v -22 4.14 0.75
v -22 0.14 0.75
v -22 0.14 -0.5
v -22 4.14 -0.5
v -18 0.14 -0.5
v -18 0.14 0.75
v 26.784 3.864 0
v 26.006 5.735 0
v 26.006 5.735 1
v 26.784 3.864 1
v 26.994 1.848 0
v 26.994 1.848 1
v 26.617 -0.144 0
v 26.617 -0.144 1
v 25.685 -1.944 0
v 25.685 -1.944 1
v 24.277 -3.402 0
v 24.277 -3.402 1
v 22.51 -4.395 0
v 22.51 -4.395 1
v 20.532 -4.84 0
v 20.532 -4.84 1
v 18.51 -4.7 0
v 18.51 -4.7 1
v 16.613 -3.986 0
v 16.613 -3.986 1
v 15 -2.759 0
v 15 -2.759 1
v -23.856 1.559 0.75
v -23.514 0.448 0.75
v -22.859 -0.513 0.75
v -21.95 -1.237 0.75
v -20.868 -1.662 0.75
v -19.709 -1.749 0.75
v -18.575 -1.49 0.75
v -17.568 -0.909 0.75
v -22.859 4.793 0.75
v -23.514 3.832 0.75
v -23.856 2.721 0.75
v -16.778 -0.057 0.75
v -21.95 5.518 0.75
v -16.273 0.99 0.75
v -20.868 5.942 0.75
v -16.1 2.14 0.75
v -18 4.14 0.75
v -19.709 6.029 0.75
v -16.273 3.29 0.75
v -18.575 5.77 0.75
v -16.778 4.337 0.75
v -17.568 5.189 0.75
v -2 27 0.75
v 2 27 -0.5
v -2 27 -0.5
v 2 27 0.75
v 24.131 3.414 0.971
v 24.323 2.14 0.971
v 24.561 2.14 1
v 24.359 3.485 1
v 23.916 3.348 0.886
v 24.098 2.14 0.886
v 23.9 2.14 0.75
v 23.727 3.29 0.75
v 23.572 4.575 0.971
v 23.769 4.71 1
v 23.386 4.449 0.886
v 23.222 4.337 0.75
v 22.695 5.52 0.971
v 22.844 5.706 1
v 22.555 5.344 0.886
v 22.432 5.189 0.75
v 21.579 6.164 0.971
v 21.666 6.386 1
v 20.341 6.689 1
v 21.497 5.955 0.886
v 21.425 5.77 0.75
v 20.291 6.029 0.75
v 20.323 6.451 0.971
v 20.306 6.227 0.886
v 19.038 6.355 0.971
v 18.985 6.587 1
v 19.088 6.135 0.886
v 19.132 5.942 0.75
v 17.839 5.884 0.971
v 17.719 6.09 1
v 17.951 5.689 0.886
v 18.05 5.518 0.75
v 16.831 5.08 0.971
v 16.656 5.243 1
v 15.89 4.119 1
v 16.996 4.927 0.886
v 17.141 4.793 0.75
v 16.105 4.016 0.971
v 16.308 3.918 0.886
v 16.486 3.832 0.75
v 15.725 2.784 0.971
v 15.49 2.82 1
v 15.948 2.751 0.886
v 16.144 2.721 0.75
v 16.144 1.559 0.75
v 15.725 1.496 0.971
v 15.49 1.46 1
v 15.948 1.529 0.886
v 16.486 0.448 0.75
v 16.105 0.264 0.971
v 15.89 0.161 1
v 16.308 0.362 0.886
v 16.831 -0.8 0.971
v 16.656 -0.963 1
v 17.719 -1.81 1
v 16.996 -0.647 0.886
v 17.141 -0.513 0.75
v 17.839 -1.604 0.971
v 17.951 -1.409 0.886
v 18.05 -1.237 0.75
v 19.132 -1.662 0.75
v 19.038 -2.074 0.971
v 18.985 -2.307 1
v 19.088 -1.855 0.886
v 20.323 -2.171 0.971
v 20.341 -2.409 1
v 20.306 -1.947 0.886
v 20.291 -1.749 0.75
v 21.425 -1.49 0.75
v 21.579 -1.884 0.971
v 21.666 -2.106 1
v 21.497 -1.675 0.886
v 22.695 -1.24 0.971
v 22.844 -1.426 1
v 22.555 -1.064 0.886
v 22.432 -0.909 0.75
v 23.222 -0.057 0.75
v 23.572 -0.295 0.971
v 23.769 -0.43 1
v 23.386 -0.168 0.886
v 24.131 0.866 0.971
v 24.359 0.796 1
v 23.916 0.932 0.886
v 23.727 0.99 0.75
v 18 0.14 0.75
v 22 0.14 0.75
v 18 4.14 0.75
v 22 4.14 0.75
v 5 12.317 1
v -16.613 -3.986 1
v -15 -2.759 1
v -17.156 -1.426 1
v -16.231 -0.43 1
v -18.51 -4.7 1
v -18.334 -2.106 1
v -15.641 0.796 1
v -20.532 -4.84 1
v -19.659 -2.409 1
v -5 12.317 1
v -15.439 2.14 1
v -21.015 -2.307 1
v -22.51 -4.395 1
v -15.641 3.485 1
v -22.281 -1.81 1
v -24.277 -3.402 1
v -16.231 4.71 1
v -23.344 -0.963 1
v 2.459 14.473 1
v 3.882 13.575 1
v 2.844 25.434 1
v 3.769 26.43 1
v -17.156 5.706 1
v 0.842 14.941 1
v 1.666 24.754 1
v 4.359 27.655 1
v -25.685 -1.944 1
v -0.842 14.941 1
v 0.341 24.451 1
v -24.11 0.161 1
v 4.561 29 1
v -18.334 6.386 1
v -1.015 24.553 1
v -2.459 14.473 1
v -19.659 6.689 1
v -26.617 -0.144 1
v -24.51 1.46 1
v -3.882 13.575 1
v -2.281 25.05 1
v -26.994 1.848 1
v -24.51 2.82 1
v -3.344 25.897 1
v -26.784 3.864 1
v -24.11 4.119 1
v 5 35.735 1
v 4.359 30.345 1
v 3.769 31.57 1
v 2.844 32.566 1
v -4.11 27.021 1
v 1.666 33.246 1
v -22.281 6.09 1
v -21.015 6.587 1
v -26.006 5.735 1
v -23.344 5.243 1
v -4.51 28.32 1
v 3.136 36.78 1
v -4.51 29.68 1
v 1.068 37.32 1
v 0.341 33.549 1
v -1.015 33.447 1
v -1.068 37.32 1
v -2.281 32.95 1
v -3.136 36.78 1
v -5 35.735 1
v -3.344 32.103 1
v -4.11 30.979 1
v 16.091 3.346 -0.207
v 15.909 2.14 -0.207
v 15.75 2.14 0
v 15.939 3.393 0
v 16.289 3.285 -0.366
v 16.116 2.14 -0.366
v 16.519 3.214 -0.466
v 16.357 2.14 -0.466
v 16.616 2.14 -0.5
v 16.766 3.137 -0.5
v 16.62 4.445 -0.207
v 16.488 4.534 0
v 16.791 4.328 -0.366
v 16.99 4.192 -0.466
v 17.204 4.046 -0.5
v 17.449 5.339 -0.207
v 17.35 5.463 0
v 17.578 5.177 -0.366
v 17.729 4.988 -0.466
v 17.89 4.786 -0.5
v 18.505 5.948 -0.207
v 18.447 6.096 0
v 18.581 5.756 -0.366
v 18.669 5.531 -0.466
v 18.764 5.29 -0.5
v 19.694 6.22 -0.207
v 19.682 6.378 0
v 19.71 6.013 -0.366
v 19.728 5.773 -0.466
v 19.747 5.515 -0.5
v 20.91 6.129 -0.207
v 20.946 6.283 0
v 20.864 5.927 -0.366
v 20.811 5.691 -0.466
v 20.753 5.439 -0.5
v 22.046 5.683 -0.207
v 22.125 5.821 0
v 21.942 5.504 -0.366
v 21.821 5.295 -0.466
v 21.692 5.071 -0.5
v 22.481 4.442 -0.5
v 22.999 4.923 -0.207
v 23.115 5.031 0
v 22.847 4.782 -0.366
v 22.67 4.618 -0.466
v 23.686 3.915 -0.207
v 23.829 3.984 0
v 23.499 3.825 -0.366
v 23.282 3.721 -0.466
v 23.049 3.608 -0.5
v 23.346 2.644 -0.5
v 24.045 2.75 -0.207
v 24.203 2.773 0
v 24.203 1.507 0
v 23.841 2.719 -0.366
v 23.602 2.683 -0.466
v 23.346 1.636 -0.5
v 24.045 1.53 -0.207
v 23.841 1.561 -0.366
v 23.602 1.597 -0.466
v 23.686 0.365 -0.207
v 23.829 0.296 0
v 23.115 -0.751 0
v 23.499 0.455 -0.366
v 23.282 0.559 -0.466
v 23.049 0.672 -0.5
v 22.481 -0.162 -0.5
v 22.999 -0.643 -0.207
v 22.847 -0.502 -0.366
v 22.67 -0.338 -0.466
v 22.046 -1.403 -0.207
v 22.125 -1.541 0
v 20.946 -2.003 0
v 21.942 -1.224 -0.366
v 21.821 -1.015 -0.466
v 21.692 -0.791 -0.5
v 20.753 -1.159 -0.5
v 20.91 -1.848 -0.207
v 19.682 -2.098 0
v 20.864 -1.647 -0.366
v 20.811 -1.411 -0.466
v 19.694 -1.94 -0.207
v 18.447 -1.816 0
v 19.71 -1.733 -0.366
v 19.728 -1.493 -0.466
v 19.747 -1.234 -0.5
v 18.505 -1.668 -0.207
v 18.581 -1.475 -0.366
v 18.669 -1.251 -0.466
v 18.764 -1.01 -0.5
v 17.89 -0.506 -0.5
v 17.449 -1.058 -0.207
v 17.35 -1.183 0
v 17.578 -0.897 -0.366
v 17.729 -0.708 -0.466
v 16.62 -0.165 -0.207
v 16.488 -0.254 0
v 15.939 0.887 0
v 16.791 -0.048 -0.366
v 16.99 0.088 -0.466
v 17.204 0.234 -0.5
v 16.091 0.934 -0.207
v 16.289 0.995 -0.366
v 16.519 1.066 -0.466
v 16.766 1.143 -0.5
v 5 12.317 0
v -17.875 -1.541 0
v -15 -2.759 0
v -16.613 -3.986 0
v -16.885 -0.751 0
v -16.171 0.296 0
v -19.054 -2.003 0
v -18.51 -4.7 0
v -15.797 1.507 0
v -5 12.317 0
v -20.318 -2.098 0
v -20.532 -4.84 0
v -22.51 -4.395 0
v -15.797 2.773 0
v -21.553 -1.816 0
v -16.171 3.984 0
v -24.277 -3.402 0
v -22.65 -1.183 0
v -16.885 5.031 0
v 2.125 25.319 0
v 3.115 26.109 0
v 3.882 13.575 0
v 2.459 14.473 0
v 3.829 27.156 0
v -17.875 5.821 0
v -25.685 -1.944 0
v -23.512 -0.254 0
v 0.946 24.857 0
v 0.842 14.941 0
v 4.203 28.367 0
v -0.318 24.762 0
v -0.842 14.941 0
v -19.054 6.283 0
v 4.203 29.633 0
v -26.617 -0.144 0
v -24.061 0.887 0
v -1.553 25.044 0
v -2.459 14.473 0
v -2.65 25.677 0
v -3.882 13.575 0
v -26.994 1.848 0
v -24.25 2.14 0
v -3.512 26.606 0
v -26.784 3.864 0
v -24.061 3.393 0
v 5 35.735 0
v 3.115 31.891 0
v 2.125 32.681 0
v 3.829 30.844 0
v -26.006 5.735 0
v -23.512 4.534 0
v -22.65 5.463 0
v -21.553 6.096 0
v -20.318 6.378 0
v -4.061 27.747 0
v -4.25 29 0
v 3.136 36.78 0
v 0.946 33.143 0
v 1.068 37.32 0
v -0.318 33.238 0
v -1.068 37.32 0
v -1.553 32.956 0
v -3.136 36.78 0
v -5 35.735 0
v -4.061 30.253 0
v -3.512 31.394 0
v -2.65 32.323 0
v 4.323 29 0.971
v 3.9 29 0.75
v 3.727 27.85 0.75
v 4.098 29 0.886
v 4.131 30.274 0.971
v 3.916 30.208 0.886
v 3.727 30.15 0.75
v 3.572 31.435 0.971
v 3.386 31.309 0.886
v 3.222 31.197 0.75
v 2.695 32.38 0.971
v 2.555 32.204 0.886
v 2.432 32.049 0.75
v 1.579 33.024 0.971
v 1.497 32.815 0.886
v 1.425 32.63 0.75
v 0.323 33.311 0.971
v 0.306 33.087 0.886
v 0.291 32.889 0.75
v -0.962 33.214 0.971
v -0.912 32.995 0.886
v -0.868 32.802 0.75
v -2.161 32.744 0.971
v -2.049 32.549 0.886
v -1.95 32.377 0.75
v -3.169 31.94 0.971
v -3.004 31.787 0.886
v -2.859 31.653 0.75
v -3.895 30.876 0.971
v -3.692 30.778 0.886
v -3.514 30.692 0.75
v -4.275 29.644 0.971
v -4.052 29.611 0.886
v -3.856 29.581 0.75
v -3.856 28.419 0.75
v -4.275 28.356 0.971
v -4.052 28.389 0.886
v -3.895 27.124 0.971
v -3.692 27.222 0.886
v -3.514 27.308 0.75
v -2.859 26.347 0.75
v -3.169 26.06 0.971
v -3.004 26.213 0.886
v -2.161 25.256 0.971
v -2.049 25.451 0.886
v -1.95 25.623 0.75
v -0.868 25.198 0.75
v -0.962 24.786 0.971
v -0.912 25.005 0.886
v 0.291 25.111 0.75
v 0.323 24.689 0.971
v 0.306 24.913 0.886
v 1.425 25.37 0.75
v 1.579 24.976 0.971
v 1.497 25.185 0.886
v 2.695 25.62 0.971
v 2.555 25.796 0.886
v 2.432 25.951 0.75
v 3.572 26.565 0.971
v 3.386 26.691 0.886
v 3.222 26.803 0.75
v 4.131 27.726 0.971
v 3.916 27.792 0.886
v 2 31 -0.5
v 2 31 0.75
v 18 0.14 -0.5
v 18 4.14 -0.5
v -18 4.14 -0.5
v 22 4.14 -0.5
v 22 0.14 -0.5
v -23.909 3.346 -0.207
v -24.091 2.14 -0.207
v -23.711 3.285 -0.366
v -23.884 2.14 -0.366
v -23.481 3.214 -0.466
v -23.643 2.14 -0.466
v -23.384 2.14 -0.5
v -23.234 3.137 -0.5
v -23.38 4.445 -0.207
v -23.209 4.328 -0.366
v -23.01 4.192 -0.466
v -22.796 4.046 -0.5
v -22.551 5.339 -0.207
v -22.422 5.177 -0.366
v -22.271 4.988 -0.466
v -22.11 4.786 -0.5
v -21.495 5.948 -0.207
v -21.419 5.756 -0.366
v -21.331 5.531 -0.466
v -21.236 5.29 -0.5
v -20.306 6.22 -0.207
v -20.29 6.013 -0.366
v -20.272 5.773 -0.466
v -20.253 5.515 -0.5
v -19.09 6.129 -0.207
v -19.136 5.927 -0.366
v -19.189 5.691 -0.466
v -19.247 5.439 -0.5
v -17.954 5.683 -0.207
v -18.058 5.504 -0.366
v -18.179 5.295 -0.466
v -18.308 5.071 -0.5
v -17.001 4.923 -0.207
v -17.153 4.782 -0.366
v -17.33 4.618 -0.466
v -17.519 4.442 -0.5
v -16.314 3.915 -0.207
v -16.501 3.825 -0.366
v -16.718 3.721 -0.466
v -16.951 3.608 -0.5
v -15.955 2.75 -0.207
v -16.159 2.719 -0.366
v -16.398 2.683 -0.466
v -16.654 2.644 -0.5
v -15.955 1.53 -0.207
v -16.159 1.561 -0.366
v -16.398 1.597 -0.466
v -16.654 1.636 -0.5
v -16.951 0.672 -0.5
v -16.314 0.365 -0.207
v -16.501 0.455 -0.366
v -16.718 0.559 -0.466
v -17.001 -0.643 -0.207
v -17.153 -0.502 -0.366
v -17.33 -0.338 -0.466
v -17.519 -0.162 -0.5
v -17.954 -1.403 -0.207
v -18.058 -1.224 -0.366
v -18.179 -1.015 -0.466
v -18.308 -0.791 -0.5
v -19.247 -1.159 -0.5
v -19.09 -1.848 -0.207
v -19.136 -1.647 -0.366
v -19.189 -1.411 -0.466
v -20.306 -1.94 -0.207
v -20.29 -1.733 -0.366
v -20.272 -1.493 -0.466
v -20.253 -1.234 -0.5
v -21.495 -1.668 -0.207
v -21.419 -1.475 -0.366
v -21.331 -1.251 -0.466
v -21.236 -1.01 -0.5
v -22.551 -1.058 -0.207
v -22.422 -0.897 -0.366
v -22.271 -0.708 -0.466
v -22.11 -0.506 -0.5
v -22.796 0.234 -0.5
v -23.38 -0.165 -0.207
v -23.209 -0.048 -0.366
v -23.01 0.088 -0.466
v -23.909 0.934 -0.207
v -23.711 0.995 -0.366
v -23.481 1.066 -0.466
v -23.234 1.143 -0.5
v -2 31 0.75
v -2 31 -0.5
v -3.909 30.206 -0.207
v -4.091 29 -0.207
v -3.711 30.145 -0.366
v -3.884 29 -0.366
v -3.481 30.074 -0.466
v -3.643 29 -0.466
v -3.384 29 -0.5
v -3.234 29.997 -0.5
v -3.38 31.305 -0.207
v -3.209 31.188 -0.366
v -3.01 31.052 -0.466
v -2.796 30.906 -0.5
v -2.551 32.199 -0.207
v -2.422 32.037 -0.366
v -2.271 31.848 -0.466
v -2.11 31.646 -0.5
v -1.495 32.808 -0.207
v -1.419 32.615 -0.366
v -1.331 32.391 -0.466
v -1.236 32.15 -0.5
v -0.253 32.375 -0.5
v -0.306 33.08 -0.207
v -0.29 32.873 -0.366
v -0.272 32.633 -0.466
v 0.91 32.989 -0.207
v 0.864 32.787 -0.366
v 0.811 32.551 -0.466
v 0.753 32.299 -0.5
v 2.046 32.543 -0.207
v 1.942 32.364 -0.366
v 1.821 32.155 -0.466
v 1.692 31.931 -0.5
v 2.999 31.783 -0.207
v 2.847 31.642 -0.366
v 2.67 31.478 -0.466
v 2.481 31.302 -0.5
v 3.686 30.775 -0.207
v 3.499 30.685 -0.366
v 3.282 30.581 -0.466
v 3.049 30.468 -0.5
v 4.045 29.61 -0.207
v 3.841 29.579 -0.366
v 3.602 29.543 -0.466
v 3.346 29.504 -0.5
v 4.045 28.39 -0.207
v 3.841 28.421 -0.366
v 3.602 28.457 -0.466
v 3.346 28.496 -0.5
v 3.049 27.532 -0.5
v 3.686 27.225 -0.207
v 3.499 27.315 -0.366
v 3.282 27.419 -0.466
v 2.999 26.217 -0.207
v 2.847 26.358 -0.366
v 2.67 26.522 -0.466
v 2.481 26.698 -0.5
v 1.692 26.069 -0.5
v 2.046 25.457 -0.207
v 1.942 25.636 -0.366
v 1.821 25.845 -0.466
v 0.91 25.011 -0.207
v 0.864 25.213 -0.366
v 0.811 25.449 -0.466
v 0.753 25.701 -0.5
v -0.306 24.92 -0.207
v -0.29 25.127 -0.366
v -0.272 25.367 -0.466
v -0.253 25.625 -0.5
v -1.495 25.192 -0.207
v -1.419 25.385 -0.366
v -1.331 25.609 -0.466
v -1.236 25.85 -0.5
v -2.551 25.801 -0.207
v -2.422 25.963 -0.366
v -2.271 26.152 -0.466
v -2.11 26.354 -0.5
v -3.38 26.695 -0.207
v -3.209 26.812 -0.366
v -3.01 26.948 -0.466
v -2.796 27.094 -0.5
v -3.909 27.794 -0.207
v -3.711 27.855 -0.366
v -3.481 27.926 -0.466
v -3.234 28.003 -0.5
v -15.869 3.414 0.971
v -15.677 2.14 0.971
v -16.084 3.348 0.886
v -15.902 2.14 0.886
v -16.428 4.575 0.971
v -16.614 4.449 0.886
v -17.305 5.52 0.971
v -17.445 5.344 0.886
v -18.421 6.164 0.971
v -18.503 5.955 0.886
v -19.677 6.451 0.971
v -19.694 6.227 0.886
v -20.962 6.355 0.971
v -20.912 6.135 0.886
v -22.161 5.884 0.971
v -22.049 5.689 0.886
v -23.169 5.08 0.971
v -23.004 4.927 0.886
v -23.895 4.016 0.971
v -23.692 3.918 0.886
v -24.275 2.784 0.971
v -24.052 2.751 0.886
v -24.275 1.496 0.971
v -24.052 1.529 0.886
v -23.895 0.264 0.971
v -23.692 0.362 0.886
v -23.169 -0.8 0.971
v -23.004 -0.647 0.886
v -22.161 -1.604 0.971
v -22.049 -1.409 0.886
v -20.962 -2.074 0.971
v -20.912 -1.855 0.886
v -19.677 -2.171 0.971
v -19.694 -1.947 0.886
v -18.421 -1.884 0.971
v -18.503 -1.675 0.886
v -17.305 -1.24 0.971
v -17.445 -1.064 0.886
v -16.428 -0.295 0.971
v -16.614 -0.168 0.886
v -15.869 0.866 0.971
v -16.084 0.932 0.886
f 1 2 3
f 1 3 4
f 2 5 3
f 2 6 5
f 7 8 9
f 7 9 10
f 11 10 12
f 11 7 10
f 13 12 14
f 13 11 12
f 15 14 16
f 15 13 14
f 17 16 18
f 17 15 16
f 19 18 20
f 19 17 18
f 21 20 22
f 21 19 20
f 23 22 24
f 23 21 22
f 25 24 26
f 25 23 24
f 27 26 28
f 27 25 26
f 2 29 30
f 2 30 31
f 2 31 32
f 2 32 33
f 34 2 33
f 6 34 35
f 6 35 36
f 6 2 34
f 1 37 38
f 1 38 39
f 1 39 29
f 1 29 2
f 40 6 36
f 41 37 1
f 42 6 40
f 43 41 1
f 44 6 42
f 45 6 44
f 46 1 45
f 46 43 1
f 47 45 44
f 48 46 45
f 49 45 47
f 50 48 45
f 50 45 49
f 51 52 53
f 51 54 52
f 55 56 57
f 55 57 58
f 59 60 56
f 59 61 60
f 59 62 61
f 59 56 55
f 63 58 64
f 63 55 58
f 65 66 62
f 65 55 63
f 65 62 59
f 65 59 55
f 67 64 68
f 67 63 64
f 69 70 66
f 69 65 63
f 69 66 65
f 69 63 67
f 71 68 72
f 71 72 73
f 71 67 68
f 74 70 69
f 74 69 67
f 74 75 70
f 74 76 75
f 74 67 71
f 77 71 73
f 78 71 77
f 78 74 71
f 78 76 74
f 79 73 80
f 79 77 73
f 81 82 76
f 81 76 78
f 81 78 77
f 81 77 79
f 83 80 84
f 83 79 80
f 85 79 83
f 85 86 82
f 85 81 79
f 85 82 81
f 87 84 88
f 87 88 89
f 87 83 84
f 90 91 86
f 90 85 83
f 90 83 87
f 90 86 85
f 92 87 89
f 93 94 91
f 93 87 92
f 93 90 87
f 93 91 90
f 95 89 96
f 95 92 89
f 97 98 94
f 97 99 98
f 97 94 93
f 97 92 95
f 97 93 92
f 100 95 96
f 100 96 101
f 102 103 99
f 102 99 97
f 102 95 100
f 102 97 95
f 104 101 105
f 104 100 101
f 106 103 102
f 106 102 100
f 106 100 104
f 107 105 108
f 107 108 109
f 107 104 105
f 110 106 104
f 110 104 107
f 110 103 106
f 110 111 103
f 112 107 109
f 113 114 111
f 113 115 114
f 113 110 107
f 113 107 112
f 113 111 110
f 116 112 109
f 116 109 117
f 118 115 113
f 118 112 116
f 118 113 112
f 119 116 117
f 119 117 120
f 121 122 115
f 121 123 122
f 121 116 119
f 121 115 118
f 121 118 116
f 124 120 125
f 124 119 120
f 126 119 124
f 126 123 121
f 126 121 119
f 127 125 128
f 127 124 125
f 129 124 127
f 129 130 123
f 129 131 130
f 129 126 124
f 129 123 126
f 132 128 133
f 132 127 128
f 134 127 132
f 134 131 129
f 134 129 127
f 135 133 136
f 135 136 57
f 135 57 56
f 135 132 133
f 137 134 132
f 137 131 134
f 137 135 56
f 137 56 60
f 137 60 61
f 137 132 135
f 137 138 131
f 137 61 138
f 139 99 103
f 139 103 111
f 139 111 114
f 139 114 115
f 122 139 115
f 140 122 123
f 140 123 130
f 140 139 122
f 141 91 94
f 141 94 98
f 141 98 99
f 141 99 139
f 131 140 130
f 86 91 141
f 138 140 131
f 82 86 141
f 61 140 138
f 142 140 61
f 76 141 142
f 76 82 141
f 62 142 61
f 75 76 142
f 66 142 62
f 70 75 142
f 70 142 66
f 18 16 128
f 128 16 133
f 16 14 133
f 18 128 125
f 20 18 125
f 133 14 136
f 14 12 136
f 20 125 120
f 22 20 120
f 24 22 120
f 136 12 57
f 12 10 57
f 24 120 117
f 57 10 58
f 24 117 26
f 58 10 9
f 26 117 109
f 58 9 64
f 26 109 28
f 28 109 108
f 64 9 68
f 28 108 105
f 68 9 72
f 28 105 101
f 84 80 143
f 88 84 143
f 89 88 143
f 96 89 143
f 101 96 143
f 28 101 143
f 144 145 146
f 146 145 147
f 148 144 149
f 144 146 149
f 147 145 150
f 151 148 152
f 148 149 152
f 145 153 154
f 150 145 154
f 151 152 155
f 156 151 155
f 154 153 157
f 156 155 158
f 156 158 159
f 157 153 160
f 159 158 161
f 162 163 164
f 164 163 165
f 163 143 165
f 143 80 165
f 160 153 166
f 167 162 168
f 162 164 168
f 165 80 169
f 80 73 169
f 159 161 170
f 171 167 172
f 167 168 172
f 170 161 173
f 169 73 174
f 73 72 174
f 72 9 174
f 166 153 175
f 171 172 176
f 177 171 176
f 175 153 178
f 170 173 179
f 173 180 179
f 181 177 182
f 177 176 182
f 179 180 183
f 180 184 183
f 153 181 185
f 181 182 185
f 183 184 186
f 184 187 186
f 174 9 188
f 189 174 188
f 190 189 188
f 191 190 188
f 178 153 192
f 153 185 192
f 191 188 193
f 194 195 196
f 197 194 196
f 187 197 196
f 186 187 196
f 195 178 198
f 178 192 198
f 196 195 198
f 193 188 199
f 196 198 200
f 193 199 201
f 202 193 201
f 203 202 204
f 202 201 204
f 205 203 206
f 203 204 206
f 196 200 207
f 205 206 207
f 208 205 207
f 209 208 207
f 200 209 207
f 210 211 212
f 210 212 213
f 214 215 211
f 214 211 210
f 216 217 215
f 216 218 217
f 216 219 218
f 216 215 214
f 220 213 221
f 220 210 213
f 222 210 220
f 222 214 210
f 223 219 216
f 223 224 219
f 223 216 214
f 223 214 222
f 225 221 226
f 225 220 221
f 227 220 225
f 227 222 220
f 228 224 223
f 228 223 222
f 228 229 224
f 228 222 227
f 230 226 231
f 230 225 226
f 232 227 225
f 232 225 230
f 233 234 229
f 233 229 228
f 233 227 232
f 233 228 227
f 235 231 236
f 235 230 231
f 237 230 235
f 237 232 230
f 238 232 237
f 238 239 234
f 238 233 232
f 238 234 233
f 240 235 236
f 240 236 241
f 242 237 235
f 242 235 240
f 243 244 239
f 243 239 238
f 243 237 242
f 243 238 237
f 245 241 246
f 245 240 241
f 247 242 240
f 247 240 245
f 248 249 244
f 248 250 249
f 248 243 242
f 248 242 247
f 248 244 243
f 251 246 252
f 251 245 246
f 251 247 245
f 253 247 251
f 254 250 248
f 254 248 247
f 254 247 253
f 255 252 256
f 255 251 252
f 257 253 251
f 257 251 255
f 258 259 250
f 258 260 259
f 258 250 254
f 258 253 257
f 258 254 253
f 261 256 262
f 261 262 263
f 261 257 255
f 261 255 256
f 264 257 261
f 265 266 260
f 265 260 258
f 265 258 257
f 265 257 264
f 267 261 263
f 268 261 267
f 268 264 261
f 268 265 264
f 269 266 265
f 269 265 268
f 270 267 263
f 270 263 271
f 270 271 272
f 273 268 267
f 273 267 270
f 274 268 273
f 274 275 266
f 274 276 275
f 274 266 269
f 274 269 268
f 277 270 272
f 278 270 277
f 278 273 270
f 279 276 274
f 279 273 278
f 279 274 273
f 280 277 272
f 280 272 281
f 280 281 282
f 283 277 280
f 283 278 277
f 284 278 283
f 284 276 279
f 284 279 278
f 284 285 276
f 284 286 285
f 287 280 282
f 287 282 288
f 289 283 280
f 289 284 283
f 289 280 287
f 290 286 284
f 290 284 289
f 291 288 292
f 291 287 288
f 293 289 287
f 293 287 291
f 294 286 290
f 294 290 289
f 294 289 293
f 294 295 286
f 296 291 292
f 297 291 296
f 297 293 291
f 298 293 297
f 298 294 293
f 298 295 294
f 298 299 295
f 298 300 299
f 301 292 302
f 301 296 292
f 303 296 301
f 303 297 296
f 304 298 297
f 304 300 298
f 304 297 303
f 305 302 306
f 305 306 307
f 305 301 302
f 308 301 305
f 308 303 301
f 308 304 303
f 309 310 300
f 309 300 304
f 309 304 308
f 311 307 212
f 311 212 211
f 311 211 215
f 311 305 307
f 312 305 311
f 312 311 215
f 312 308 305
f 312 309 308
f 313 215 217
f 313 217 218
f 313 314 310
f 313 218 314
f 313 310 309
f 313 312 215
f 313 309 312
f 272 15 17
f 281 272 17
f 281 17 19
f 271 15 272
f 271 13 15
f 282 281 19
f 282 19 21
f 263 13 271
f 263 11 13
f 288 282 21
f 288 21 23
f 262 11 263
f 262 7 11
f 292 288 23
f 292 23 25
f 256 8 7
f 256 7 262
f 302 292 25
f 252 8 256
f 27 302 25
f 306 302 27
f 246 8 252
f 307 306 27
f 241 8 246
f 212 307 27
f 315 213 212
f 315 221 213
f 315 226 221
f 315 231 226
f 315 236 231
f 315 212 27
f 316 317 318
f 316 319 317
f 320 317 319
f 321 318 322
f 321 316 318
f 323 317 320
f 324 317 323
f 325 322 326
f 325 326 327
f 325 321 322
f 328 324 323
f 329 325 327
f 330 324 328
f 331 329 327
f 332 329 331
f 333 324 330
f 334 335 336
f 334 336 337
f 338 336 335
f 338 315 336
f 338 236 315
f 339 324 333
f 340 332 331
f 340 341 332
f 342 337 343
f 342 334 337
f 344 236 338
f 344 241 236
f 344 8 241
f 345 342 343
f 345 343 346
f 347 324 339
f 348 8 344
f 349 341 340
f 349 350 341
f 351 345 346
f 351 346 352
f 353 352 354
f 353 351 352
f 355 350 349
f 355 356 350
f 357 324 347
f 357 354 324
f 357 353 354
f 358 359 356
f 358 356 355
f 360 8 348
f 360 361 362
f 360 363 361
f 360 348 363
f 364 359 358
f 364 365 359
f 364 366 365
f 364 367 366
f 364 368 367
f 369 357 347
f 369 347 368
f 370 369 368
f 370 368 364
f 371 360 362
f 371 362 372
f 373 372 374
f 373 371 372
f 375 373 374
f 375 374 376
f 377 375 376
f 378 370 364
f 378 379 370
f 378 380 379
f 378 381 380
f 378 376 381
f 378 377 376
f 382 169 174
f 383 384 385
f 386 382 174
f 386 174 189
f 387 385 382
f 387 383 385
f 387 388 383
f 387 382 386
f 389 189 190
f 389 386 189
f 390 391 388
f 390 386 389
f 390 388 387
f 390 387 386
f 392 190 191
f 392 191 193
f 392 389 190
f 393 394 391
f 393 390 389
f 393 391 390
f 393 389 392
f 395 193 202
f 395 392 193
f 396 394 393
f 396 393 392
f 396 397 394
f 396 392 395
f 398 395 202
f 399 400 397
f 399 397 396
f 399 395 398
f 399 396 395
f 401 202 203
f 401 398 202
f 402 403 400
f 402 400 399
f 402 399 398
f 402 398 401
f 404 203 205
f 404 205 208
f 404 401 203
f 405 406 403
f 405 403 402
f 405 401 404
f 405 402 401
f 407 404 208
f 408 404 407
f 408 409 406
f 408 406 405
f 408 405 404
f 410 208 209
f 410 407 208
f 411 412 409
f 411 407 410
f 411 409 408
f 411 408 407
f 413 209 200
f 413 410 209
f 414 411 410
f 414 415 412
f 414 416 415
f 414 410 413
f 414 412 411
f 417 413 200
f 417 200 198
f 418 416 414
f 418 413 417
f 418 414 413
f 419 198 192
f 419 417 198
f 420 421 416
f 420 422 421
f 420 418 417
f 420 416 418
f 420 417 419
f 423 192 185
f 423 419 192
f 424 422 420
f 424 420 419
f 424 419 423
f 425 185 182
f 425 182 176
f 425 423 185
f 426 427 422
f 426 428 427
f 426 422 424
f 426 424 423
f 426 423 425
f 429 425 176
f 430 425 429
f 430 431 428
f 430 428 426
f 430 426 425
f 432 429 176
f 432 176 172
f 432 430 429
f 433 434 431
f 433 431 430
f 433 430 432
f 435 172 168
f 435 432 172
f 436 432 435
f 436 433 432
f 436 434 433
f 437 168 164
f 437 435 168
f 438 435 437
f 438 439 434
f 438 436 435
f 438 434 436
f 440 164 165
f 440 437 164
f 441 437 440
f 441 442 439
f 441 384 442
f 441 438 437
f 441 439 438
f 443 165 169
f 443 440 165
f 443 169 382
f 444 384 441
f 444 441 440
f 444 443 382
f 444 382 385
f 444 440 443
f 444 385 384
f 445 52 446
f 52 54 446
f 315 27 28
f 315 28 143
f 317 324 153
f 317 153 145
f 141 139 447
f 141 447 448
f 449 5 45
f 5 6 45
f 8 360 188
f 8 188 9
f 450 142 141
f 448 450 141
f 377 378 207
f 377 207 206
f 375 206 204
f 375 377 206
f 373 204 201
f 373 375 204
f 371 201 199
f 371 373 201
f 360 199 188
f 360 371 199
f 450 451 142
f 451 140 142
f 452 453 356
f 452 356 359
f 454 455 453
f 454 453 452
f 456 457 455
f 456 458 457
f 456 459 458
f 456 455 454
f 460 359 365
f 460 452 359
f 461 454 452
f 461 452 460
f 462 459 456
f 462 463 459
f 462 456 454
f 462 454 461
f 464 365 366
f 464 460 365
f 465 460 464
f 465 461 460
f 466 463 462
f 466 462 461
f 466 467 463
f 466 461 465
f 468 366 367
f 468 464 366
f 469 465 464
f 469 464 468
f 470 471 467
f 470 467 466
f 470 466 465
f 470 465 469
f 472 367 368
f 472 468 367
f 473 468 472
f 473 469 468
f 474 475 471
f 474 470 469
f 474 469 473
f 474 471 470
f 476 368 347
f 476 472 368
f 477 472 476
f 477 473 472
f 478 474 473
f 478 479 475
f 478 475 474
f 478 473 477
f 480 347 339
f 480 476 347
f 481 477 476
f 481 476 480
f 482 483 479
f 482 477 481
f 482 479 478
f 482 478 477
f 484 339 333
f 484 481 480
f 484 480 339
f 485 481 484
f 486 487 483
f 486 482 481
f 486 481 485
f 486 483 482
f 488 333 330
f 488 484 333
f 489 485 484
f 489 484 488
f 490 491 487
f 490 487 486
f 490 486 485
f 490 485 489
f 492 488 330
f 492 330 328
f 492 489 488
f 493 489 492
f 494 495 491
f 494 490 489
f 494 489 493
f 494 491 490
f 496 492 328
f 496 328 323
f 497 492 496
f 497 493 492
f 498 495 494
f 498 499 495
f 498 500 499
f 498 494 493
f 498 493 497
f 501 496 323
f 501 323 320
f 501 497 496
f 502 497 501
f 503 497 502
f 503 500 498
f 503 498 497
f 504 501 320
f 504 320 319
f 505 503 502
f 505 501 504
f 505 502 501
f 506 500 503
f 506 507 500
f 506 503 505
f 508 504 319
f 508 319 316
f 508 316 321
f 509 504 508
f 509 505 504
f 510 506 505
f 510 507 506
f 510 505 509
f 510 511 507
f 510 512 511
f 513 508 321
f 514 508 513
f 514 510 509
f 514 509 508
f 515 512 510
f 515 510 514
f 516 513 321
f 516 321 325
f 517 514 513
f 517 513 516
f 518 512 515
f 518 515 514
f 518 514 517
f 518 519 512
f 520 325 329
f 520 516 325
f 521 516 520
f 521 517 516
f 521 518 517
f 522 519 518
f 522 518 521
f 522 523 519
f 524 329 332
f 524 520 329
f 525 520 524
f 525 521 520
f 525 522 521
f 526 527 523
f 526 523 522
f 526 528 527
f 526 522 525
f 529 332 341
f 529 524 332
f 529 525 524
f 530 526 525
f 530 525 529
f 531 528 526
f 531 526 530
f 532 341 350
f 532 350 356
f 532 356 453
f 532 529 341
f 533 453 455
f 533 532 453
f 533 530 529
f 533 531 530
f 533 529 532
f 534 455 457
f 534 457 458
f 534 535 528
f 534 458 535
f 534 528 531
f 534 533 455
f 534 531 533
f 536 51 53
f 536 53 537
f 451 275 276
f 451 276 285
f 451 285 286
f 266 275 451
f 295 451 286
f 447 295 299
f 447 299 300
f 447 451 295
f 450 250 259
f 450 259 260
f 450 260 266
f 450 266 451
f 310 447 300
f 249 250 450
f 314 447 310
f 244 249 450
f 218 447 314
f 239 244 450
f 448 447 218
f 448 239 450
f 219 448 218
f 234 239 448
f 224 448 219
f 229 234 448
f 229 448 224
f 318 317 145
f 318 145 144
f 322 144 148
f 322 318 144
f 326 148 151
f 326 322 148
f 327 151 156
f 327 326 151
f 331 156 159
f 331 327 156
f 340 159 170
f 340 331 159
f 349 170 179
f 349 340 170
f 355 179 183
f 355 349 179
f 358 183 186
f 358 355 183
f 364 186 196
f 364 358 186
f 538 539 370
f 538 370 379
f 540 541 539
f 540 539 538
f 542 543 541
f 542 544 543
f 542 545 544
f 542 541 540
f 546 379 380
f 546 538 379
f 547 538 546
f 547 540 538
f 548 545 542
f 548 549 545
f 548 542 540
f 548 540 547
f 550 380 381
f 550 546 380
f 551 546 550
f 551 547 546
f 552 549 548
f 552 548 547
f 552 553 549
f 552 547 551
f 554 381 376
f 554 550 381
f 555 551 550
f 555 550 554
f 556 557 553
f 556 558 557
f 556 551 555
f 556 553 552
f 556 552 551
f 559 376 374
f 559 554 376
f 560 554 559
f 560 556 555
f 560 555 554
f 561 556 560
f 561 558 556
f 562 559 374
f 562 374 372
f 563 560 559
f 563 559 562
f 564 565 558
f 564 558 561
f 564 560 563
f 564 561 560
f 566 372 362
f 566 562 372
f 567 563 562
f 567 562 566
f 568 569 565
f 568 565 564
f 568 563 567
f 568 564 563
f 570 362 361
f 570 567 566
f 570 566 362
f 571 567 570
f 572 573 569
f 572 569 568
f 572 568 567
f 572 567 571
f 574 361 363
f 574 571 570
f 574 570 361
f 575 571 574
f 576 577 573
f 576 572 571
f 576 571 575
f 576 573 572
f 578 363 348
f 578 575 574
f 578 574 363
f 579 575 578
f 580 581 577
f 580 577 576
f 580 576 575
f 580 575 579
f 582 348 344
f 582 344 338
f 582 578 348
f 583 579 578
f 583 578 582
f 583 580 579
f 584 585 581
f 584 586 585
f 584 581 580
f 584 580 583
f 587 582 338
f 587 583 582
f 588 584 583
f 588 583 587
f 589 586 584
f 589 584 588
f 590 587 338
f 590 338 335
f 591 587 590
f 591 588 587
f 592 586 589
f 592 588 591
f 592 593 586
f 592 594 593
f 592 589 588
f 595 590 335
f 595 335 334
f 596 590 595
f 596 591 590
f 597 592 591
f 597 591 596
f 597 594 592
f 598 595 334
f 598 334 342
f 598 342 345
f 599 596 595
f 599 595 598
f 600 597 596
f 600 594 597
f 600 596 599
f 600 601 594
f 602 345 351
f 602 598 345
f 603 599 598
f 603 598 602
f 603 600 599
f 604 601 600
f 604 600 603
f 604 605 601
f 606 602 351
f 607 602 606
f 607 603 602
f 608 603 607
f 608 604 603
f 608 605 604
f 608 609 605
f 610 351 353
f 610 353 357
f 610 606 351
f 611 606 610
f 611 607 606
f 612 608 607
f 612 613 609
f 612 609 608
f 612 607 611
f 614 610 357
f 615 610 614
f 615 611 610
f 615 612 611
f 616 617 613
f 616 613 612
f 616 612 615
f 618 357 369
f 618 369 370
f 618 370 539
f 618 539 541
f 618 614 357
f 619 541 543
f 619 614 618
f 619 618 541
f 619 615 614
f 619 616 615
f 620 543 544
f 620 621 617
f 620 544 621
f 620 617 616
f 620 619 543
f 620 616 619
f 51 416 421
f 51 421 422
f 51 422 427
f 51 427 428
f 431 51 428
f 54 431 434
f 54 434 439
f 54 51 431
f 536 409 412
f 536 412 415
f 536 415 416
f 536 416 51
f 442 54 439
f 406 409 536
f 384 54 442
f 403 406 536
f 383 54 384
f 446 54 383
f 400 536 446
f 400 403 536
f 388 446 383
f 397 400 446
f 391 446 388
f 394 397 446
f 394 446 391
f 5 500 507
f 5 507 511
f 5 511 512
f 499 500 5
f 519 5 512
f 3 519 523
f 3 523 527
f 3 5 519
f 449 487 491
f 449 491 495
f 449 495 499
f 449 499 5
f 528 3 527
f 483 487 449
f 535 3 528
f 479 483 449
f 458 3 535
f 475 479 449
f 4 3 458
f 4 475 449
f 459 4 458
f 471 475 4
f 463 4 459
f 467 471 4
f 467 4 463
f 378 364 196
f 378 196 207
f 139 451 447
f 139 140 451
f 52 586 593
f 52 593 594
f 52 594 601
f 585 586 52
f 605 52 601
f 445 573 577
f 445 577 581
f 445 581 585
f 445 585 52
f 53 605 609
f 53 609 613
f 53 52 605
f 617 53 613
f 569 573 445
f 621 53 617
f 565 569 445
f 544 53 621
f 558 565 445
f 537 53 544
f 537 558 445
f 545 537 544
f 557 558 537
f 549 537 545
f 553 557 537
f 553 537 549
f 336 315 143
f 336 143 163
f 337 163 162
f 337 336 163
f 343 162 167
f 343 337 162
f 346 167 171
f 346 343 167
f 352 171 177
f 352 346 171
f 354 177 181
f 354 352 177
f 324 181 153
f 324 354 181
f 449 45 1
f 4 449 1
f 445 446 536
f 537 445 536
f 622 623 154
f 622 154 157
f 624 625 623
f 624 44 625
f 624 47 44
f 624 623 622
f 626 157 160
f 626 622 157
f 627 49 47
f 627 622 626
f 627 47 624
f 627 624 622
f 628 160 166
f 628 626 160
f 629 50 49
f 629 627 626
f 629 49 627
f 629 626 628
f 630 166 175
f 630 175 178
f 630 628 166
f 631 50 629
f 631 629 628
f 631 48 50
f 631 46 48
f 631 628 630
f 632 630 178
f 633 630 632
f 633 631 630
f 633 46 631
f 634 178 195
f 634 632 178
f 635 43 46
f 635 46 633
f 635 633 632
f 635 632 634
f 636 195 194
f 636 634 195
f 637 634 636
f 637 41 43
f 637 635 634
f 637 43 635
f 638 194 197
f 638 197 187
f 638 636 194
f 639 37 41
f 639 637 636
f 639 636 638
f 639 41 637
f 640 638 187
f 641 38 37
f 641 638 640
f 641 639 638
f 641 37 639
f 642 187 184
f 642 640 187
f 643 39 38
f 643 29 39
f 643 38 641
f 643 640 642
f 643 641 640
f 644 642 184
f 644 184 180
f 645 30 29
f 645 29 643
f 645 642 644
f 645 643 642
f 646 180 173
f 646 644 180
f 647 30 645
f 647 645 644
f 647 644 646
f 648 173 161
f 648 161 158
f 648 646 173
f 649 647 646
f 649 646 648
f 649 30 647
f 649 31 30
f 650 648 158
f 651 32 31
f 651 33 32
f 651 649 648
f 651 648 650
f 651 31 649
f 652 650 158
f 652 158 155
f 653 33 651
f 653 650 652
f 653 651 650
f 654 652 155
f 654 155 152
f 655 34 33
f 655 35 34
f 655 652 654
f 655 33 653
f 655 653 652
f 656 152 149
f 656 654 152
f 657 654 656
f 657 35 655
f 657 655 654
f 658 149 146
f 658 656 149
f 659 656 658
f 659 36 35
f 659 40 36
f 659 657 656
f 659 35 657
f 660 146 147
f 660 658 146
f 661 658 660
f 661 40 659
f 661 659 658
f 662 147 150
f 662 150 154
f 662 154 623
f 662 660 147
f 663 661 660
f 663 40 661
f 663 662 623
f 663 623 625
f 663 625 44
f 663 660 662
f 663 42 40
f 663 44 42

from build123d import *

# Parameters (mm, degrees)
BOSS_EXTRUDE2_DEPTH = 1
SKETCH2_R           = 3.9
CUT_EXTRUDE1_DEPTH  = 0.25
FILLET1_R           = 1
SKETCH5_W           = 4
SKETCH5_H           = 4
CUT_EXTRUDE6_DEPTH  = 2
SKETCH6_R           = 4.25
SKETCH6_W           = 4
SKETCH6_H           = 4
BOSS_EXTRUDE3_DEPTH = 0.5
FILLET2_R           = 1


with BuildPart() as part:
    # Sketch1 → Boss-Extrude2 (new body)
    with BuildSketch(Plane.XY):
        with BuildLine():
            Line((-5, 12.31662479), (-15, -2.758942439))
            ThreePointArc((-15, -2.758942439), (-24.276770595, -3.401554175), (-26.006226146, 5.735207068))
            Line((-26.006226146, 5.735207068), (-5, 35.735207068))
            ThreePointArc((-5, 35.735207068), (0, 37.388266463), (5, 35.735207068))
            Line((5, 35.735207068), (26.006226146, 5.735207068))
            ThreePointArc((26.006226146, 5.735207068), (24.276770595, -3.401554175), (15, -2.758942439))
            Line((15, -2.758942439), (5, 12.31662479))
            ThreePointArc((5, 12.31662479), (0, 15), (-5, 12.31662479))
        make_face()
    extrude(amount=BOSS_EXTRUDE2_DEPTH)

    # Sketch2 → Cut-Extrude1 (cut)
    with BuildSketch(Plane.XY.offset(1)):
        with Locations((-20, 2.140037047)):
            Circle(SKETCH2_R)
        with Locations((20, 2.140037047)):
            Circle(SKETCH2_R)
        with Locations((0, 29)):
            Circle(SKETCH2_R)
    extrude(amount=-CUT_EXTRUDE1_DEPTH, mode=Mode.SUBTRACT)

    # Fillet1
    # the kernel refuses this fillet: 1 mm, written as the material it takes off along each edge
    with BuildSketch(Plane(origin=(-20, 2.140037047, 1), x_dir=(1, 0, 0), z_dir=(0, -1, 0))) as fillet1_piece_1:
        with BuildLine():
            CenterArc((4.561437828, -1), FILLET1_R, 90, 41.409622109)
            Line((3.9, -0.25), (3.886771243, -0.235))
            ThreePointArc((3.886771243, -0.235), (3.88, -0.125), (3.88, 0))
            Line((3.88, 0), (3.9, 0.02))
            Line((3.9, 0.02), (4.561437828, 0.02))
            Line((4.561437828, 0.02), (4.561437828, 0))
        make_face()
    revolve(axis=Axis((-20, 2.140037047, 1), (0, 0, 1)), mode=Mode.SUBTRACT)
    with BuildSketch(Plane(origin=(20, 2.140037047, 1), x_dir=(1, 0, 0), z_dir=(0, -1, 0))) as fillet1_piece_2:
        with BuildLine():
            CenterArc((4.561437828, -1), FILLET1_R, 90, 41.409622109)
            Line((3.9, -0.25), (3.886771243, -0.235))
            ThreePointArc((3.886771243, -0.235), (3.88, -0.125), (3.88, 0))
            Line((3.88, 0), (3.9, 0.02))
            Line((3.9, 0.02), (4.561437828, 0.02))
            Line((4.561437828, 0.02), (4.561437828, 0))
        make_face()
    revolve(axis=Axis((20, 2.140037047, 1), (0, 0, 1)), mode=Mode.SUBTRACT)
    with BuildSketch(Plane(origin=(0, 29, 1), x_dir=(1, 0, 0), z_dir=(0, -1, 0))) as fillet1_piece_3:
        with BuildLine():
            CenterArc((4.561437828, -1), FILLET1_R, 90, 41.409622109)
            Line((3.9, -0.25), (3.886771243, -0.235))
            ThreePointArc((3.886771243, -0.235), (3.88, -0.125), (3.88, 0))
            Line((3.88, 0), (3.9, 0.02))
            Line((3.9, 0.02), (4.561437828, 0.02))
            Line((4.561437828, 0.02), (4.561437828, 0))
        make_face()
    revolve(axis=Axis((0, 29, 1), (0, 0, 1)), mode=Mode.SUBTRACT)

    # Sketch5 → Cut-Extrude6 (cut)
    with BuildSketch(Plane.XY.offset(1)):
        with Locations((0, 29)):
            Rectangle(SKETCH5_W, SKETCH5_H)
        with Locations((20, 2.140037047)):
            Rectangle(SKETCH5_W, SKETCH5_H)
        with Locations((-20, 2.140037047)):
            Rectangle(SKETCH5_W, SKETCH5_H)
    extrude(amount=-CUT_EXTRUDE6_DEPTH, mode=Mode.SUBTRACT)

    # Sketch6 → Boss-Extrude3 (add)
    # profile 1 of 3: a face of its own
    with BuildSketch(Plane(origin=(0, 0, 0), x_dir=(-1, 0, 0), z_dir=(0, 0, -1))):
        with Locations((0, 29)):
            Circle(SKETCH6_R)
        with Locations((0, 29)):
            Rectangle(SKETCH6_W, SKETCH6_H, mode=Mode.SUBTRACT)
    # profile 2 of 3: a face of its own
    with BuildSketch(Plane(origin=(0, 0, 0), x_dir=(-1, 0, 0), z_dir=(0, 0, -1))):
        with Locations((-20, 2.140037047)):
            Circle(SKETCH6_R)
        with Locations((-20, 2.140037047)):
            Rectangle(SKETCH6_W, SKETCH6_H, mode=Mode.SUBTRACT)
    # profile 3 of 3: a face of its own
    with BuildSketch(Plane(origin=(0, 0, 0), x_dir=(-1, 0, 0), z_dir=(0, 0, -1))):
        with Locations((20, 2.140037047)):
            Circle(SKETCH6_R)
        with Locations((20, 2.140037047)):
            Rectangle(SKETCH6_W, SKETCH6_H, mode=Mode.SUBTRACT)
    extrude(amount=BOSS_EXTRUDE3_DEPTH)

    # Fillet2
    # the kernel refuses this fillet: 1 mm, written as the material it takes off along each edge
    with BuildSketch(Plane(origin=(0, 29, -0.5), x_dir=(-1, 0, 0), z_dir=(0, -1, 0))) as fillet2_piece_1:
        with BuildLine():
            CenterArc((3.383974596, -1), FILLET2_R, 30, 60)
            Line((4.25, -0.5), (4.267320508, -0.49))
            ThreePointArc((4.267320508, -0.49), (4.27, -0.25), (4.27, 0))
            Line((4.27, 0), (4.25, 0.02))
            Line((4.25, 0.02), (3.383974596, 0.02))
            Line((3.383974596, 0.02), (3.383974596, 0))
        make_face()
    revolve(axis=Axis((0, 29, -0.5), (0, 0, -1)), mode=Mode.SUBTRACT)
    with BuildSketch(Plane(origin=(20, 2.140037047, -0.5), x_dir=(-1, 0, 0), z_dir=(0, -1, 0))) as fillet2_piece_2:
        with BuildLine():
            CenterArc((3.383974596, -1), FILLET2_R, 30, 60)
            Line((4.25, -0.5), (4.267320508, -0.49))
            ThreePointArc((4.267320508, -0.49), (4.27, -0.25), (4.27, 0))
            Line((4.27, 0), (4.25, 0.02))
            Line((4.25, 0.02), (3.383974596, 0.02))
            Line((3.383974596, 0.02), (3.383974596, 0))
        make_face()
    revolve(axis=Axis((20, 2.140037047, -0.5), (0, 0, -1)), mode=Mode.SUBTRACT)
    with BuildSketch(Plane(origin=(-20, 2.140037047, -0.5), x_dir=(-1, 0, 0), z_dir=(0, -1, 0))) as fillet2_piece_3:
        with BuildLine():
            CenterArc((3.383974596, -1), FILLET2_R, 30, 60)
            Line((4.25, -0.5), (4.267320508, -0.49))
            ThreePointArc((4.267320508, -0.49), (4.27, -0.25), (4.27, 0))
            Line((4.27, 0), (4.25, 0.02))
            Line((4.25, 0.02), (3.383974596, 0.02))
            Line((3.383974596, 0.02), (3.383974596, 0))
        make_face()
    revolve(axis=Axis((-20, 2.140037047, -0.5), (0, 0, -1)), mode=Mode.SUBTRACT)


solid = part.part
